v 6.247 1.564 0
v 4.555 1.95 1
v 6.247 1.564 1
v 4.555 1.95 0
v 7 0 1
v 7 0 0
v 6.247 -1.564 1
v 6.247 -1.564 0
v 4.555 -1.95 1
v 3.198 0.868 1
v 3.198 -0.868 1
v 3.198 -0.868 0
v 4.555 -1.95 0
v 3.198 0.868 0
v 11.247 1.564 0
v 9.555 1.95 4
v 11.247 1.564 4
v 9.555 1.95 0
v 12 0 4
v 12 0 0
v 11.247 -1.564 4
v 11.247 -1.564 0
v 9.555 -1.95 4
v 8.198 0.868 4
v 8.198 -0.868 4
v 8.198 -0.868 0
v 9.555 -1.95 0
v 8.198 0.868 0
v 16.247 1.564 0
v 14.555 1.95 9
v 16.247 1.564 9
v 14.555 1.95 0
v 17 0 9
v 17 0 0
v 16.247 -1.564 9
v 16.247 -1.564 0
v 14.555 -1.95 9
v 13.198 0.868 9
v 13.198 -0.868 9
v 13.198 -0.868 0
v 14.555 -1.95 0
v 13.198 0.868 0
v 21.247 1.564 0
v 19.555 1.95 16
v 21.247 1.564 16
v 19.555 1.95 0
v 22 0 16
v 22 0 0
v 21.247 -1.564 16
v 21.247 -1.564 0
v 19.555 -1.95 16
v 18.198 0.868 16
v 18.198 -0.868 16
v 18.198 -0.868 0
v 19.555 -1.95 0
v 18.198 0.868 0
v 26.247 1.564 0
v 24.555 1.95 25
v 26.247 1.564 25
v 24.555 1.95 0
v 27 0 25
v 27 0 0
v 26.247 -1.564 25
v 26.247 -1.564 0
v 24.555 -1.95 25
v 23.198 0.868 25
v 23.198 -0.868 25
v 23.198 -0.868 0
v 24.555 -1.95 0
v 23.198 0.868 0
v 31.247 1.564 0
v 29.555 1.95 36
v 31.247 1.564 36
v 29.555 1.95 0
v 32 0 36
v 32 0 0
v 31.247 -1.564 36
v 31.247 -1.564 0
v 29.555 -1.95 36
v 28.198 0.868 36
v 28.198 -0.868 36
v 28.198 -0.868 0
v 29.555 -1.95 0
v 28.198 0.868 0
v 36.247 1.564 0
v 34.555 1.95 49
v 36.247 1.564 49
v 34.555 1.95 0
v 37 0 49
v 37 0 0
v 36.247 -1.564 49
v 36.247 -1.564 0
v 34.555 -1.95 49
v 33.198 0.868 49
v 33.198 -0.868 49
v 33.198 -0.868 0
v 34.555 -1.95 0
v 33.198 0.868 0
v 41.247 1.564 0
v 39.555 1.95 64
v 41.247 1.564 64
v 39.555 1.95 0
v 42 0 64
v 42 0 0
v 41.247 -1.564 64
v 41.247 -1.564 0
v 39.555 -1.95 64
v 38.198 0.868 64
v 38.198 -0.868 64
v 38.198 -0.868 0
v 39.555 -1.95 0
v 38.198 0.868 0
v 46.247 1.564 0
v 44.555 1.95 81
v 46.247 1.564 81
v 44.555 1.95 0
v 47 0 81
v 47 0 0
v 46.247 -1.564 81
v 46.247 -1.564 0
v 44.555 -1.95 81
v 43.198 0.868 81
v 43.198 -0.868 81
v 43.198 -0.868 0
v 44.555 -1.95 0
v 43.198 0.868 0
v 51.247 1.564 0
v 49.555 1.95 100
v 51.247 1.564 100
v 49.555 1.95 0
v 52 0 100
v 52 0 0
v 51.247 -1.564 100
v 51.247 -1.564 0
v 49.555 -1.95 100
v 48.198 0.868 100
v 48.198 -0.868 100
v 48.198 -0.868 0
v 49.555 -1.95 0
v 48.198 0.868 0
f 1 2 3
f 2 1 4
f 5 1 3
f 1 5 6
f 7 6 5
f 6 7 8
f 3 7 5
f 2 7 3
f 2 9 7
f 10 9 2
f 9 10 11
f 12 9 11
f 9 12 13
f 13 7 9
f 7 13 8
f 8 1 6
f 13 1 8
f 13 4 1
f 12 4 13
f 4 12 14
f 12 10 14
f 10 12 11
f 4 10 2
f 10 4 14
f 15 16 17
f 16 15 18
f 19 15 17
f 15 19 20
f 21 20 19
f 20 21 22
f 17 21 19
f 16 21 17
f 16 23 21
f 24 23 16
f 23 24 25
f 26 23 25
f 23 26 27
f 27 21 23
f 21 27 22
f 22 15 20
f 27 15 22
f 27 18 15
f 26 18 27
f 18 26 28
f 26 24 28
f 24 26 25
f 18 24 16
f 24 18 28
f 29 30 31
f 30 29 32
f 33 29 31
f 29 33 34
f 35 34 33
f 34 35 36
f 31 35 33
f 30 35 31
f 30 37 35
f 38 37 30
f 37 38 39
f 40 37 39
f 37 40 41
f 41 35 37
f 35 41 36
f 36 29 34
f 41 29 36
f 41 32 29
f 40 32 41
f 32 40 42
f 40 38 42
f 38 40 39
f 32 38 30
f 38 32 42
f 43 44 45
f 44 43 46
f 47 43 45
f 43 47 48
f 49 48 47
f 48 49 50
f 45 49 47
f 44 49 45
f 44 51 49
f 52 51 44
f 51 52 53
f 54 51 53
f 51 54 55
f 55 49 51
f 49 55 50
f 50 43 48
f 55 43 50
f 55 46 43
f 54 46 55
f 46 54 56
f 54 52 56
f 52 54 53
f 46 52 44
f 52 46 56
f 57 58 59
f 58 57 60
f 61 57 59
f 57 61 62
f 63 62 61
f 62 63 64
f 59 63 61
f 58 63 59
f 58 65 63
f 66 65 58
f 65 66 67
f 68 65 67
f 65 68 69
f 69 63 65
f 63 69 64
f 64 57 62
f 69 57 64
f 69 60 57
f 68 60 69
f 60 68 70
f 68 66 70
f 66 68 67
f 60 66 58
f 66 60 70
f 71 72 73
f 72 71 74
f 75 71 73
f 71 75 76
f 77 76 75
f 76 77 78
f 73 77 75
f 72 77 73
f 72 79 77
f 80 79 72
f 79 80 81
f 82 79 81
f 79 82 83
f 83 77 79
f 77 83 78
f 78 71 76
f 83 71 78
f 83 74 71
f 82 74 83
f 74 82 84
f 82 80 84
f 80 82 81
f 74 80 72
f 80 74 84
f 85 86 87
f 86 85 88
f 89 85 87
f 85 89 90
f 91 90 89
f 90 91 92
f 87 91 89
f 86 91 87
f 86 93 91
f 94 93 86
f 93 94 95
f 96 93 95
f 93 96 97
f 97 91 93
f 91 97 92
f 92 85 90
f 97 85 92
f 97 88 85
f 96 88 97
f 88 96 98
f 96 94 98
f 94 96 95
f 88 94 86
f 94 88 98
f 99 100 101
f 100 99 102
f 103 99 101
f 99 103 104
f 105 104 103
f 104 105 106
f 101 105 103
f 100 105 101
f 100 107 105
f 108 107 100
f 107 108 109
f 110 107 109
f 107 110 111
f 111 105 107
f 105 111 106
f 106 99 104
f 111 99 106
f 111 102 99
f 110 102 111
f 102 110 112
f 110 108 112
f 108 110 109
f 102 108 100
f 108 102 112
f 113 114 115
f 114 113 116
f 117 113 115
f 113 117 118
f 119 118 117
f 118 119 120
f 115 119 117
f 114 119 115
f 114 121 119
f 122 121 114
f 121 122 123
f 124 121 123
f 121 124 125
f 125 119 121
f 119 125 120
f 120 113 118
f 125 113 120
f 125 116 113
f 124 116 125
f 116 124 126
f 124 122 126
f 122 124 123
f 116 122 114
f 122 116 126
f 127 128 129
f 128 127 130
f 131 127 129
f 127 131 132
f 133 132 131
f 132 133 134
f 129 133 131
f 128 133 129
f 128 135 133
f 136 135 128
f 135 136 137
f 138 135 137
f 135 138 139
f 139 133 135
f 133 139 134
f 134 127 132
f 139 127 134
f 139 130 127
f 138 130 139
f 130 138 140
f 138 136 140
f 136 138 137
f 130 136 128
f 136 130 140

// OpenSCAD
for (x=[1:1:10]) {
    height = x*x;
    x_position = 5*x;
    translate([x_position, 0, 0]) cylinder(h=height, r1=2, r2=2);
}
